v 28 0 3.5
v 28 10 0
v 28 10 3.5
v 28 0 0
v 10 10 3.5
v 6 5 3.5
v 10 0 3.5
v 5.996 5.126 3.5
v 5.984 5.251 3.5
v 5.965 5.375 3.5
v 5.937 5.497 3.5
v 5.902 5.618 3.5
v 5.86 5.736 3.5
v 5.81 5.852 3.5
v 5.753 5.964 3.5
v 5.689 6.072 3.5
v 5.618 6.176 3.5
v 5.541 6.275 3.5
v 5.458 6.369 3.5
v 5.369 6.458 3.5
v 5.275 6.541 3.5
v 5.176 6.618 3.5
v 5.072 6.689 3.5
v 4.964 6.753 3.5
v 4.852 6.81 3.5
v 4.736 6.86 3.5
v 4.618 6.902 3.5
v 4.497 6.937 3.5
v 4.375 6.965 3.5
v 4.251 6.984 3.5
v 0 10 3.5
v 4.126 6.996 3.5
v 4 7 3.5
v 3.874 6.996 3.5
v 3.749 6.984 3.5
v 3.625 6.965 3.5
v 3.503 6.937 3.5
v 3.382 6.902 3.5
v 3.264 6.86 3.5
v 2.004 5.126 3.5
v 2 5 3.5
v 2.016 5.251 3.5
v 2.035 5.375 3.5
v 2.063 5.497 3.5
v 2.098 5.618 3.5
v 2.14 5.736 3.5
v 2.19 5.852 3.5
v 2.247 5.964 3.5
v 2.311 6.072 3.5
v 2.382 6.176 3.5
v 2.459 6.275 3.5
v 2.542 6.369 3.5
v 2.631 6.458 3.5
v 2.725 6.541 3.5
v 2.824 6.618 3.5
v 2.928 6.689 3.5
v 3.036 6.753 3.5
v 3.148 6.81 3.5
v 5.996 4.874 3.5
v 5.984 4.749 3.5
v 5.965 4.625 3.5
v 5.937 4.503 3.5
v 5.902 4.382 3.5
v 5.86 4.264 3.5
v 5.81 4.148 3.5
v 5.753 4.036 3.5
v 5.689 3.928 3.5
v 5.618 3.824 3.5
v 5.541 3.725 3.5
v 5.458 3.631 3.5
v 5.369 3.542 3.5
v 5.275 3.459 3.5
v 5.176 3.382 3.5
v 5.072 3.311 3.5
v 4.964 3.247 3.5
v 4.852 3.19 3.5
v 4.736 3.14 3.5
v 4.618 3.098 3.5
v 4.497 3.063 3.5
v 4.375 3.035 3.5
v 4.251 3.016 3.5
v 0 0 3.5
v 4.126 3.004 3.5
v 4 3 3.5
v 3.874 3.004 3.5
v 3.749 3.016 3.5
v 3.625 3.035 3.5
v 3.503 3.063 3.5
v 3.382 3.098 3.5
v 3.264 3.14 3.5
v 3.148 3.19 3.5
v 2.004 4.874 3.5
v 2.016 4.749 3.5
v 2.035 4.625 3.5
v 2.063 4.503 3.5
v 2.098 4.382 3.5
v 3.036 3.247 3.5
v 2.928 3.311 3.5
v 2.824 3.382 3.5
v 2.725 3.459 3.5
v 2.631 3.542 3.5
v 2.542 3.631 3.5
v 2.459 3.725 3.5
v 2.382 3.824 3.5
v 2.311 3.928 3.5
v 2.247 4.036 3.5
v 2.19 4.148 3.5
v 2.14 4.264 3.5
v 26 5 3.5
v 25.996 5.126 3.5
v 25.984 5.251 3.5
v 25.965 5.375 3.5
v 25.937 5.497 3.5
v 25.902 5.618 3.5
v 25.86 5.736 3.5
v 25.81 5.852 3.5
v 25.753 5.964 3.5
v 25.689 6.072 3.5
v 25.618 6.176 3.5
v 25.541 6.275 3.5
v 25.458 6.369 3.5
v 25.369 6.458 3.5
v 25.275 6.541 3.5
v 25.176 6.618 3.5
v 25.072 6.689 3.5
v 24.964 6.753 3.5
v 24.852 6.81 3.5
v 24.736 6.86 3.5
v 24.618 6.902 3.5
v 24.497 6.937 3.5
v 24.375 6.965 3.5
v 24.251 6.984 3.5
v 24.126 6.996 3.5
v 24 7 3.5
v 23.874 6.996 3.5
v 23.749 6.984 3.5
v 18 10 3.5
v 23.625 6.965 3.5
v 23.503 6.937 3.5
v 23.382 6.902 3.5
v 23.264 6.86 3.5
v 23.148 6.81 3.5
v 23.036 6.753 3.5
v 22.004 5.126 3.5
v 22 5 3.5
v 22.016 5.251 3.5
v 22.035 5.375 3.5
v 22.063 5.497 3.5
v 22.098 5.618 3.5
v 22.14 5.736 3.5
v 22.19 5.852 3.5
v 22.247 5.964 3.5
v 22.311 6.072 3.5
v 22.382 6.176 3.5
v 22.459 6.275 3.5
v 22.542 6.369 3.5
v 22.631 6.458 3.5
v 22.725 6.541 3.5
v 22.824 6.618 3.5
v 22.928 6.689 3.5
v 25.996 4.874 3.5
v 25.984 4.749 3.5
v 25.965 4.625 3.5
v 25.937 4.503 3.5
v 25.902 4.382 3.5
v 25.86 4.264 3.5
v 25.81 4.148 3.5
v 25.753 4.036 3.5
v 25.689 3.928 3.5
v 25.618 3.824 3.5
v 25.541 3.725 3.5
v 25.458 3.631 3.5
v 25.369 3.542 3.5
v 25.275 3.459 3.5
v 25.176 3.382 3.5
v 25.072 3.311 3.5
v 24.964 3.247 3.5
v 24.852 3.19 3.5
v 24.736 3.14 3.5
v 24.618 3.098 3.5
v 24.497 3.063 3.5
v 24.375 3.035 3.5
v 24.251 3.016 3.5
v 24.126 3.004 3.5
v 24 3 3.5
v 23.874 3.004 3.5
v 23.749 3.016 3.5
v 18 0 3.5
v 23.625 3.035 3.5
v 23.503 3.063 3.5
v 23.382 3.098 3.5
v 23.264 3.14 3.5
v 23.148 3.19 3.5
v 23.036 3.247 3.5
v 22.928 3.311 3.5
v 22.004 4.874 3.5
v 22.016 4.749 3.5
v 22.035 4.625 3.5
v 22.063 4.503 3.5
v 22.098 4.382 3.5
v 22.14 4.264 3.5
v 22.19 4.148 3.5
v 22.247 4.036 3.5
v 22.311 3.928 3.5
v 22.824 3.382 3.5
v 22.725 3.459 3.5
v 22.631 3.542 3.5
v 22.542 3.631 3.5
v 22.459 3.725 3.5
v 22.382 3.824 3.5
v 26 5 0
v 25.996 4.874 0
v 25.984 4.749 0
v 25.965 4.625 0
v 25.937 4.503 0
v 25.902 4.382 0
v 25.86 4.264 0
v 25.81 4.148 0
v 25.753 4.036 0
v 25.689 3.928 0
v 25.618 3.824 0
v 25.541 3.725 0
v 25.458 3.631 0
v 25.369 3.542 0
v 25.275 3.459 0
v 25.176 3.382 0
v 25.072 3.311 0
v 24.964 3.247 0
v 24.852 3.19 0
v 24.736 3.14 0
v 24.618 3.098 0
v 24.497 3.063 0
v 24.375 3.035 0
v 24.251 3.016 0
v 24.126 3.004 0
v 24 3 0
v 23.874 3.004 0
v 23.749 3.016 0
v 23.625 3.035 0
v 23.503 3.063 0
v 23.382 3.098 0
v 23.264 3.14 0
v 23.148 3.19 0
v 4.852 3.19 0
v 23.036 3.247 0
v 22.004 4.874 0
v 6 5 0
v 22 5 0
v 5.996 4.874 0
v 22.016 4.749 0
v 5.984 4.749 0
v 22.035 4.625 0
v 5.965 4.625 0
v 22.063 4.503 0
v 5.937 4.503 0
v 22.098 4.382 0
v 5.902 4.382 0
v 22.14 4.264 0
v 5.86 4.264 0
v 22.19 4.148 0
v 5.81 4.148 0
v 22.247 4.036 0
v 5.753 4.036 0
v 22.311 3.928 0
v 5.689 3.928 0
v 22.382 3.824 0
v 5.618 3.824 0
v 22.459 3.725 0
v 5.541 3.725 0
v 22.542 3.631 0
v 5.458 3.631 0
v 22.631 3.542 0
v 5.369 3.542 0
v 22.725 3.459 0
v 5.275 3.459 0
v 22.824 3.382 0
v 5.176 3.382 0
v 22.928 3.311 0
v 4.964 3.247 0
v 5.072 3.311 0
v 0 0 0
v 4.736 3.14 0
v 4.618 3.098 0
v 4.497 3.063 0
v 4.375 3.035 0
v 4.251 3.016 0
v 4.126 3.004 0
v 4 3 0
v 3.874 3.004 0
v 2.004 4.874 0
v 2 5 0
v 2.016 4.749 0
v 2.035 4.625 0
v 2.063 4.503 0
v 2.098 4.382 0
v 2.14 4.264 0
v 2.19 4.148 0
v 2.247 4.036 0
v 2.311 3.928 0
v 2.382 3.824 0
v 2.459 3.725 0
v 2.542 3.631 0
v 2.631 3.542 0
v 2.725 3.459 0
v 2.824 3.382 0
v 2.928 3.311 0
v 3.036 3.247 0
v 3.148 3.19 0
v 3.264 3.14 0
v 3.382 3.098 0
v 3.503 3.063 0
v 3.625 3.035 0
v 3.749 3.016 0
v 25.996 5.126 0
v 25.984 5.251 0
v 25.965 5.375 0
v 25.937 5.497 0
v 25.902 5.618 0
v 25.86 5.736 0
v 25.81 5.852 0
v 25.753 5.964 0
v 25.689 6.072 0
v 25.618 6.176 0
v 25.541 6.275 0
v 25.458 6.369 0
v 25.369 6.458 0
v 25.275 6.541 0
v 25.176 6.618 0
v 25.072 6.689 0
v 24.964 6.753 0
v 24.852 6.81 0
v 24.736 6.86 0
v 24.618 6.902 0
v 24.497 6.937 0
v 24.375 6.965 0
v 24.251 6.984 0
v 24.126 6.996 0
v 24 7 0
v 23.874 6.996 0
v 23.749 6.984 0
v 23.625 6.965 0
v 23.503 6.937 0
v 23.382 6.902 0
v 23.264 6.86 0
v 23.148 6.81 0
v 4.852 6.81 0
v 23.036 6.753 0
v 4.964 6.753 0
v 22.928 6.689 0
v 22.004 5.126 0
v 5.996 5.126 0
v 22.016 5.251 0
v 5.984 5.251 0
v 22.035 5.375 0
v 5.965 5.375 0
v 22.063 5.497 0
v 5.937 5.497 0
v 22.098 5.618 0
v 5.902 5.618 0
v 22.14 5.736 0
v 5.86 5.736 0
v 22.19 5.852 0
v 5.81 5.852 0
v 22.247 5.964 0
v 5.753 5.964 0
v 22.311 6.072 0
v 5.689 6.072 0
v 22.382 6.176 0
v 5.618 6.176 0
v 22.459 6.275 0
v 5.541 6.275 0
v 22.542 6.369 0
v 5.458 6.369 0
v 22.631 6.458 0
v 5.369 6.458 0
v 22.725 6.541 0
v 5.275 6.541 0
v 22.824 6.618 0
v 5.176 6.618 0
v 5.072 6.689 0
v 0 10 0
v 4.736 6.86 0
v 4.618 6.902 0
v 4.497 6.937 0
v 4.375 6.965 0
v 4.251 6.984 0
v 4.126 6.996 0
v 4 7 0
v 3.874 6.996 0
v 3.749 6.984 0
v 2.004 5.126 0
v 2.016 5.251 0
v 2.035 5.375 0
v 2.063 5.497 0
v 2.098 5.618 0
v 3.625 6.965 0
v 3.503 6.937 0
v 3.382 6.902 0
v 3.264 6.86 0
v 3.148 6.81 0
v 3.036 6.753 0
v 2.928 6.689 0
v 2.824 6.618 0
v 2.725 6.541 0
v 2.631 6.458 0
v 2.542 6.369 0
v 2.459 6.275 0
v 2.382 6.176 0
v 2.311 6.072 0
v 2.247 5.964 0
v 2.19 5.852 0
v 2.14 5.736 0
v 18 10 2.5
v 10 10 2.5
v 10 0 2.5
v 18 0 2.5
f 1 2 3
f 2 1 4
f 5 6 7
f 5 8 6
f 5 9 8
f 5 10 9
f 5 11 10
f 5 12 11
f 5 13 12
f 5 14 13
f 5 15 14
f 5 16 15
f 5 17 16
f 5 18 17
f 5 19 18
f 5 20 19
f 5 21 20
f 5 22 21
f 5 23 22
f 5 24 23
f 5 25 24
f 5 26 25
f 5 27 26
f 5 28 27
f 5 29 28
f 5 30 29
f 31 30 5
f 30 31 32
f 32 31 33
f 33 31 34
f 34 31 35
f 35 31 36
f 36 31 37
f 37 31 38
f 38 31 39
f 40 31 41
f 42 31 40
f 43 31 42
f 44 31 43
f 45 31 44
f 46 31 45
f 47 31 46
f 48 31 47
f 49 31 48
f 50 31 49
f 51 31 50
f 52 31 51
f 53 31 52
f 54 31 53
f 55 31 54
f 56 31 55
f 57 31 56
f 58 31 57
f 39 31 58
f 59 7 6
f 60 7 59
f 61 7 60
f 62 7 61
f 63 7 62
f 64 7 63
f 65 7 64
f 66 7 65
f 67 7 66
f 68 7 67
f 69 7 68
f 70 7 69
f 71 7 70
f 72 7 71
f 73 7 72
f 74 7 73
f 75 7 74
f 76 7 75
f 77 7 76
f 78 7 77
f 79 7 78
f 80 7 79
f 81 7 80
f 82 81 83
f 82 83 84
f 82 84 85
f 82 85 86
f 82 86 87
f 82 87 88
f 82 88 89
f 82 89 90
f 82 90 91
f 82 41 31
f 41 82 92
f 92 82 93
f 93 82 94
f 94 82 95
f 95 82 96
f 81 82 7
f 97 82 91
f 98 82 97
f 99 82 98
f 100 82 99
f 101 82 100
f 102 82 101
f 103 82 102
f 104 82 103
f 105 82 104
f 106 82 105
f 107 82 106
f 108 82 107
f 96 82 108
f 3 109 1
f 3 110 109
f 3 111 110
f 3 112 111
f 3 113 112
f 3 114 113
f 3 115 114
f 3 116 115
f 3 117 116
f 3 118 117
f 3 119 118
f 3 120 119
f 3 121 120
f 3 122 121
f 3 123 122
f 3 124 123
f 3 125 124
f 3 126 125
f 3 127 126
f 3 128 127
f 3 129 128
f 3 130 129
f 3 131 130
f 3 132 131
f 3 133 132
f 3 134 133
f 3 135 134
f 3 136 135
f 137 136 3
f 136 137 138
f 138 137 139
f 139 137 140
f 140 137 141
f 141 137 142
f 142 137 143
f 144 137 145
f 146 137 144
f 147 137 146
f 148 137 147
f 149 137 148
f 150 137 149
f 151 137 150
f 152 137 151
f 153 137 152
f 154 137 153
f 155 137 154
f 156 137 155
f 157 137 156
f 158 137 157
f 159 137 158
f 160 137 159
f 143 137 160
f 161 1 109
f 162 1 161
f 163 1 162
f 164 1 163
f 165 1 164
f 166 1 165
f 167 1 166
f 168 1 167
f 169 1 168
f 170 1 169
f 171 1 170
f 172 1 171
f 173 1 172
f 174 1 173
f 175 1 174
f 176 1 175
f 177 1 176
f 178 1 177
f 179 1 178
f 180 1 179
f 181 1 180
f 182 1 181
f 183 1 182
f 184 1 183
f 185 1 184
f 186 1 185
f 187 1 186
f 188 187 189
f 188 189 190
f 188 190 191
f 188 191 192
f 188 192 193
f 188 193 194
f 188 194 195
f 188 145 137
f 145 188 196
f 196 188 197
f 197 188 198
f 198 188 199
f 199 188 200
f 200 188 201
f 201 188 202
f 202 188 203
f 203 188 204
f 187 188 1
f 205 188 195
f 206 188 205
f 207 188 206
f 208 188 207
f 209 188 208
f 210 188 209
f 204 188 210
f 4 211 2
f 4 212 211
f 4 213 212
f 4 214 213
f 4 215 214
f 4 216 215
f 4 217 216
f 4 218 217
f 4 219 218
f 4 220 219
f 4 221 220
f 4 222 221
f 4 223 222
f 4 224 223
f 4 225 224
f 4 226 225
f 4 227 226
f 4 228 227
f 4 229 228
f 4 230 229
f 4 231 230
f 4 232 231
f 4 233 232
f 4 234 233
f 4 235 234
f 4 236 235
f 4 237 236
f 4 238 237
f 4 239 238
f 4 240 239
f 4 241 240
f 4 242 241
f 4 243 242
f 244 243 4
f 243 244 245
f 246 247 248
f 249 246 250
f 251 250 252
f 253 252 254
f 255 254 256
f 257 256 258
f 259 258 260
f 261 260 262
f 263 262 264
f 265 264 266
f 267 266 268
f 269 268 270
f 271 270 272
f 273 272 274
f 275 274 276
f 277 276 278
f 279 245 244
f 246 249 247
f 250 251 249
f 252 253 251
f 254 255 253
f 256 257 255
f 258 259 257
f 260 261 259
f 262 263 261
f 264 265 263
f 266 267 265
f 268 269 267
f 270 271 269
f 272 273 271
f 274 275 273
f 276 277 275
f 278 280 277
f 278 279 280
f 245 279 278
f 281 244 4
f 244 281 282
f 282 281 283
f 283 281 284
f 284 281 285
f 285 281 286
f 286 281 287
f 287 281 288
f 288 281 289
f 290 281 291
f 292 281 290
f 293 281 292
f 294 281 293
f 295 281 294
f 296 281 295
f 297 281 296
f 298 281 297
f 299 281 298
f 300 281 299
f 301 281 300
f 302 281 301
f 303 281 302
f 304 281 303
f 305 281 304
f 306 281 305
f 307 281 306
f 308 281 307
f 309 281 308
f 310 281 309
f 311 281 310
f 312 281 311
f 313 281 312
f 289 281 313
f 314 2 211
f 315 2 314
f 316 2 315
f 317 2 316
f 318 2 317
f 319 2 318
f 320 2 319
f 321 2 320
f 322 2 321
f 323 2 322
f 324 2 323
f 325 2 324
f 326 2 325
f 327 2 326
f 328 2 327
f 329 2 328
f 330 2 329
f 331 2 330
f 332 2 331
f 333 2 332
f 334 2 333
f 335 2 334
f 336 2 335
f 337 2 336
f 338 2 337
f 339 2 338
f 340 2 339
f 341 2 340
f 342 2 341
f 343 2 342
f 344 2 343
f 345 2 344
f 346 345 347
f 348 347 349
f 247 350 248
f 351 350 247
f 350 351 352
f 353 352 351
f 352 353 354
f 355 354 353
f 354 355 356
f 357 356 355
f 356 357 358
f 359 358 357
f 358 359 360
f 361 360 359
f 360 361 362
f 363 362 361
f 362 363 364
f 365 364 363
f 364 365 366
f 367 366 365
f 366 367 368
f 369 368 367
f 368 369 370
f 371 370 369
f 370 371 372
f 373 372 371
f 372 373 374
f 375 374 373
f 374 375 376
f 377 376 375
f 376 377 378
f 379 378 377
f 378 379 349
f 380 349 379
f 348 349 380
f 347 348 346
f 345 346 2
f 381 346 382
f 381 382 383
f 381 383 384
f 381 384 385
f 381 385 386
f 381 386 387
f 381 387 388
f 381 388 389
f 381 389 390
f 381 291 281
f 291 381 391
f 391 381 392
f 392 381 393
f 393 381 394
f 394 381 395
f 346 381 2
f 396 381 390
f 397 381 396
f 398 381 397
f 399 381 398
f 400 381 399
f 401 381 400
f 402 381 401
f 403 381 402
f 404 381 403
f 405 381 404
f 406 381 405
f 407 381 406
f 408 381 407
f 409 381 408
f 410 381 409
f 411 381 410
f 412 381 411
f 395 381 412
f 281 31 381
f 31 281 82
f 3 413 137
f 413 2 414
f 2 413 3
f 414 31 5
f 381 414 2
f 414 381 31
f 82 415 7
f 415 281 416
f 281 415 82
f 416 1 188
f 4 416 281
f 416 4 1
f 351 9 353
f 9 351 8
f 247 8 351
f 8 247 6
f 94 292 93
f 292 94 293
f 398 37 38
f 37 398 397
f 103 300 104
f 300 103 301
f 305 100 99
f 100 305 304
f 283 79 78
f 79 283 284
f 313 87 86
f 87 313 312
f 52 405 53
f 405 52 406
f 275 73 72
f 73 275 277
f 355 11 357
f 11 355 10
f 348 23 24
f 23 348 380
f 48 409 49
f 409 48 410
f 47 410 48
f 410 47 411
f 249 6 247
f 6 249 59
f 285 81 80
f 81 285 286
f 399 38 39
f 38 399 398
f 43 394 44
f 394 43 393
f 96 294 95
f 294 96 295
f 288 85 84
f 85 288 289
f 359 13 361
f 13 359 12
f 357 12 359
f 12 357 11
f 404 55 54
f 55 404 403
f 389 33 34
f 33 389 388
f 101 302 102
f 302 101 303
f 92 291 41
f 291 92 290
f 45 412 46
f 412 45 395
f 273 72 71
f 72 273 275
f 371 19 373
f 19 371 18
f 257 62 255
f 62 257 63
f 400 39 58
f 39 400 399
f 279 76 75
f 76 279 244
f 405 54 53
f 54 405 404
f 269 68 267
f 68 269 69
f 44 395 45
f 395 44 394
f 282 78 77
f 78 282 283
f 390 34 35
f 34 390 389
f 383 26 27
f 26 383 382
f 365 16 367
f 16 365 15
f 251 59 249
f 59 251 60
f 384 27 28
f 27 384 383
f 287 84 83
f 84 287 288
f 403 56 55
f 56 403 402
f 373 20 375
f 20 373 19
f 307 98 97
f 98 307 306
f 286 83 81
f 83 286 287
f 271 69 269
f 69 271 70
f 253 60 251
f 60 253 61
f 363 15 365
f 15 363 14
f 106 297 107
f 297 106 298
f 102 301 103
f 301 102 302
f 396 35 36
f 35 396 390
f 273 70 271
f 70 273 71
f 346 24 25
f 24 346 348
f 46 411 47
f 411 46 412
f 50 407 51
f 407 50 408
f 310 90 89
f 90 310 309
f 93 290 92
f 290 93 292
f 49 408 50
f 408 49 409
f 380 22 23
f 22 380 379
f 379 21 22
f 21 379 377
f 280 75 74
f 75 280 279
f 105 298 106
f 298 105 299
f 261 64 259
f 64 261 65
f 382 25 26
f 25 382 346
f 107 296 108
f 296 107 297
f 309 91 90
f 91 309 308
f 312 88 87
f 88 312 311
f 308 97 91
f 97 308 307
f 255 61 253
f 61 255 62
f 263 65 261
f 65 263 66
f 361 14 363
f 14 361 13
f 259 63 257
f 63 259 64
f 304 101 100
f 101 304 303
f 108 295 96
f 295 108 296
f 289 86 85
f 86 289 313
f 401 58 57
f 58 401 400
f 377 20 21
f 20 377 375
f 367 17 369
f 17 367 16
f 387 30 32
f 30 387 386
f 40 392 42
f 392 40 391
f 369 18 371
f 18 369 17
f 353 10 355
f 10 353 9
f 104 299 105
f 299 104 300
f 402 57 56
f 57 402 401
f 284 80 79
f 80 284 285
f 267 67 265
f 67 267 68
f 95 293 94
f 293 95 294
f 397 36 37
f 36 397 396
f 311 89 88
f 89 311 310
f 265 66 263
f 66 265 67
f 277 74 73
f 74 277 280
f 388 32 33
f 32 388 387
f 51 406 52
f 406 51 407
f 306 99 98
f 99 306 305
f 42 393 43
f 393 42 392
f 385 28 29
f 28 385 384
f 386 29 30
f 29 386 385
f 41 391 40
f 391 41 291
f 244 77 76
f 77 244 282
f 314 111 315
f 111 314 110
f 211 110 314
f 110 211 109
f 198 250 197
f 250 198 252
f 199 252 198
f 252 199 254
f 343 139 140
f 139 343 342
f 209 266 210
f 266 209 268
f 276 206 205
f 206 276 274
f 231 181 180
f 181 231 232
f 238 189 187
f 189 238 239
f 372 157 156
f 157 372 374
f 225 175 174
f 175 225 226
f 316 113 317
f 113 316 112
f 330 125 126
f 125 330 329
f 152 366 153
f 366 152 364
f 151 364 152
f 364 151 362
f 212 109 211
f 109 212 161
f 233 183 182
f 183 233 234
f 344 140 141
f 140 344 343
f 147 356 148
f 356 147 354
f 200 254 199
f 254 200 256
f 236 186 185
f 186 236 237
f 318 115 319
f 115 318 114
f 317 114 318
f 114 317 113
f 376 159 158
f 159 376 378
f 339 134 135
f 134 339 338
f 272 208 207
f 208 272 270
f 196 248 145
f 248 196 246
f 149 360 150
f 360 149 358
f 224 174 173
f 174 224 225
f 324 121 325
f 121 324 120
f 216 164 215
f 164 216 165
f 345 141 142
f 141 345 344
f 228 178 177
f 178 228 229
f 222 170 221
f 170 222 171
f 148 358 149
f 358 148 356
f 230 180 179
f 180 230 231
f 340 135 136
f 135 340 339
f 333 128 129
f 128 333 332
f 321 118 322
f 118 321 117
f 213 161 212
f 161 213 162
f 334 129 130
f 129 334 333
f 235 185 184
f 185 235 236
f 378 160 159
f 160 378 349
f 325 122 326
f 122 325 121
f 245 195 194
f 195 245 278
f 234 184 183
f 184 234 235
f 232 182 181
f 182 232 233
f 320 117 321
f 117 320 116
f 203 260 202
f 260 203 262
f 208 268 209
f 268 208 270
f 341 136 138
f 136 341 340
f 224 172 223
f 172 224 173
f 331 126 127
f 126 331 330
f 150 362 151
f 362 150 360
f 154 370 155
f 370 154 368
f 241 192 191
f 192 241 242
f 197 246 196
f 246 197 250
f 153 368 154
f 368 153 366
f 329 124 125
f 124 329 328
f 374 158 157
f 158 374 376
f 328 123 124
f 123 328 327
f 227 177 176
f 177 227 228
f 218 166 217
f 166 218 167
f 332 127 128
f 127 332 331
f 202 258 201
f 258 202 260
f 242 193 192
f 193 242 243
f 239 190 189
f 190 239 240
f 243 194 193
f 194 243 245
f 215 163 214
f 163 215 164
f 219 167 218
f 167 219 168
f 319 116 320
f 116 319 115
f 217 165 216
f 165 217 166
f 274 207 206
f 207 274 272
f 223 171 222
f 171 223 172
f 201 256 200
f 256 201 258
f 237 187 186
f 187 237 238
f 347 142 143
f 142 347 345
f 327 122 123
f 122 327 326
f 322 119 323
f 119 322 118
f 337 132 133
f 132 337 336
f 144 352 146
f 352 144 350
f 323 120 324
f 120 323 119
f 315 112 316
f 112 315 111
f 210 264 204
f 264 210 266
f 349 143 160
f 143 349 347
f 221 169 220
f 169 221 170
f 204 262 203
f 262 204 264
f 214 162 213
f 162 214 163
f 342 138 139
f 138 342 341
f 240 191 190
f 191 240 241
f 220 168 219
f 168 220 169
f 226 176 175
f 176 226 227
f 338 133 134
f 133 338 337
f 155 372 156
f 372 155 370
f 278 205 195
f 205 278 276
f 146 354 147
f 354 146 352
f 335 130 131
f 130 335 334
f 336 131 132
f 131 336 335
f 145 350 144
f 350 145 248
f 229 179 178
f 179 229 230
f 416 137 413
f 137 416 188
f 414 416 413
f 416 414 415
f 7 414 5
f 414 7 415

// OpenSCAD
// file: functions.scad
/**********************************
	File: functions.scad
	Revision: 0.1 (10/7/2012)
	OpenSCAD version by:
	Michael Williams (gannon)
	mswillia@mtu.edu
**********************************/
include <config.scad>

//Drill a hole the given depth at the given location
module drill(x,y,radius,depth) {
	translate([x,y,-overdrill])
		cylinder(r=radius,h=depth,$fn=100);
}

module roundedcorner(radius,thickness,angle) {
	rotate([0,0,angle])
		translate([-radius+overdrill,-radius+overdrill,-overdrill])
			difference() {
				translate([-overdrill,-overdrill,0])
					cube([radius+overdrill,radius+overdrill,thickness+overdrill*2]);
				cylinder(r=radius,h=thickness+overdrill*2);
			}
}

//Usage: points is an array consisting of elements
//[x,y,r] for each point of the polygon
//Please note that x and y will be the centers
//of the rounded edges! Outside wall will be
//r away at some angle.
//Ideally I will make a function that will find
//the place to put the circle of a given radius
//based off of the points in the polygon.
module multiradiusroundedpoly(points,height) {
	linear_extrude(height=height)
		hull()
			for (p = points) {
				translate([p[0],p[1],0])
					circle(r=p[2],$fn=100);
			}
}
// file: config.scad
/**********************************
	File: config.scad
	Revision: 0.1 (10/7/2012)
	OpenSCAD version by:
	Michael Williams (gannon)
	mswillia@mtu.edu
**********************************/

/**********************************
		CONFIGURATION
**********************************/
//This is for the depth of holes so OpenSCAD renders correctly.
overdrill=0.1;

//Eventually group configurations into here. Maybe auto config for metric vs SAE components?

/**********************************
		END CONFIGURATION
**********************************/
// main file
/**********************************
	File: BeltClamp.scad
	Revision: 0.3 (1/5/2013)
	OpenSCAD version by:
	Michael Williams (gannon)
	mswillia@mtu.edu
**********************************/
include <config.scad>
use <functions.scad>
/**********************************
		CONFIGURATION
**********************************/
//Base size
thickness=3.5;
width=28;
height=10;

//Hole configuration
hole_spacing=20;
hole_radius=2;

//Belt configuration
belt_width=8;
belt_depth=1;

/**********************************
		END CONFIGURATION
**********************************/

difference() {

	//Make our base unit
	cube([width,height,thickness]);

	//Drill the holes
	drill(((width-hole_spacing)/2),(height/2),hole_radius,thickness+overdrill*2);
	drill(width-((width-hole_spacing)/2),(height/2),hole_radius,thickness+overdrill*2);

	//Make the belt cutout
	translate([((width-belt_width)/2),-overdrill,thickness-belt_depth])
		cube([belt_width,height+overdrill*2,belt_depth+overdrill]);

}
